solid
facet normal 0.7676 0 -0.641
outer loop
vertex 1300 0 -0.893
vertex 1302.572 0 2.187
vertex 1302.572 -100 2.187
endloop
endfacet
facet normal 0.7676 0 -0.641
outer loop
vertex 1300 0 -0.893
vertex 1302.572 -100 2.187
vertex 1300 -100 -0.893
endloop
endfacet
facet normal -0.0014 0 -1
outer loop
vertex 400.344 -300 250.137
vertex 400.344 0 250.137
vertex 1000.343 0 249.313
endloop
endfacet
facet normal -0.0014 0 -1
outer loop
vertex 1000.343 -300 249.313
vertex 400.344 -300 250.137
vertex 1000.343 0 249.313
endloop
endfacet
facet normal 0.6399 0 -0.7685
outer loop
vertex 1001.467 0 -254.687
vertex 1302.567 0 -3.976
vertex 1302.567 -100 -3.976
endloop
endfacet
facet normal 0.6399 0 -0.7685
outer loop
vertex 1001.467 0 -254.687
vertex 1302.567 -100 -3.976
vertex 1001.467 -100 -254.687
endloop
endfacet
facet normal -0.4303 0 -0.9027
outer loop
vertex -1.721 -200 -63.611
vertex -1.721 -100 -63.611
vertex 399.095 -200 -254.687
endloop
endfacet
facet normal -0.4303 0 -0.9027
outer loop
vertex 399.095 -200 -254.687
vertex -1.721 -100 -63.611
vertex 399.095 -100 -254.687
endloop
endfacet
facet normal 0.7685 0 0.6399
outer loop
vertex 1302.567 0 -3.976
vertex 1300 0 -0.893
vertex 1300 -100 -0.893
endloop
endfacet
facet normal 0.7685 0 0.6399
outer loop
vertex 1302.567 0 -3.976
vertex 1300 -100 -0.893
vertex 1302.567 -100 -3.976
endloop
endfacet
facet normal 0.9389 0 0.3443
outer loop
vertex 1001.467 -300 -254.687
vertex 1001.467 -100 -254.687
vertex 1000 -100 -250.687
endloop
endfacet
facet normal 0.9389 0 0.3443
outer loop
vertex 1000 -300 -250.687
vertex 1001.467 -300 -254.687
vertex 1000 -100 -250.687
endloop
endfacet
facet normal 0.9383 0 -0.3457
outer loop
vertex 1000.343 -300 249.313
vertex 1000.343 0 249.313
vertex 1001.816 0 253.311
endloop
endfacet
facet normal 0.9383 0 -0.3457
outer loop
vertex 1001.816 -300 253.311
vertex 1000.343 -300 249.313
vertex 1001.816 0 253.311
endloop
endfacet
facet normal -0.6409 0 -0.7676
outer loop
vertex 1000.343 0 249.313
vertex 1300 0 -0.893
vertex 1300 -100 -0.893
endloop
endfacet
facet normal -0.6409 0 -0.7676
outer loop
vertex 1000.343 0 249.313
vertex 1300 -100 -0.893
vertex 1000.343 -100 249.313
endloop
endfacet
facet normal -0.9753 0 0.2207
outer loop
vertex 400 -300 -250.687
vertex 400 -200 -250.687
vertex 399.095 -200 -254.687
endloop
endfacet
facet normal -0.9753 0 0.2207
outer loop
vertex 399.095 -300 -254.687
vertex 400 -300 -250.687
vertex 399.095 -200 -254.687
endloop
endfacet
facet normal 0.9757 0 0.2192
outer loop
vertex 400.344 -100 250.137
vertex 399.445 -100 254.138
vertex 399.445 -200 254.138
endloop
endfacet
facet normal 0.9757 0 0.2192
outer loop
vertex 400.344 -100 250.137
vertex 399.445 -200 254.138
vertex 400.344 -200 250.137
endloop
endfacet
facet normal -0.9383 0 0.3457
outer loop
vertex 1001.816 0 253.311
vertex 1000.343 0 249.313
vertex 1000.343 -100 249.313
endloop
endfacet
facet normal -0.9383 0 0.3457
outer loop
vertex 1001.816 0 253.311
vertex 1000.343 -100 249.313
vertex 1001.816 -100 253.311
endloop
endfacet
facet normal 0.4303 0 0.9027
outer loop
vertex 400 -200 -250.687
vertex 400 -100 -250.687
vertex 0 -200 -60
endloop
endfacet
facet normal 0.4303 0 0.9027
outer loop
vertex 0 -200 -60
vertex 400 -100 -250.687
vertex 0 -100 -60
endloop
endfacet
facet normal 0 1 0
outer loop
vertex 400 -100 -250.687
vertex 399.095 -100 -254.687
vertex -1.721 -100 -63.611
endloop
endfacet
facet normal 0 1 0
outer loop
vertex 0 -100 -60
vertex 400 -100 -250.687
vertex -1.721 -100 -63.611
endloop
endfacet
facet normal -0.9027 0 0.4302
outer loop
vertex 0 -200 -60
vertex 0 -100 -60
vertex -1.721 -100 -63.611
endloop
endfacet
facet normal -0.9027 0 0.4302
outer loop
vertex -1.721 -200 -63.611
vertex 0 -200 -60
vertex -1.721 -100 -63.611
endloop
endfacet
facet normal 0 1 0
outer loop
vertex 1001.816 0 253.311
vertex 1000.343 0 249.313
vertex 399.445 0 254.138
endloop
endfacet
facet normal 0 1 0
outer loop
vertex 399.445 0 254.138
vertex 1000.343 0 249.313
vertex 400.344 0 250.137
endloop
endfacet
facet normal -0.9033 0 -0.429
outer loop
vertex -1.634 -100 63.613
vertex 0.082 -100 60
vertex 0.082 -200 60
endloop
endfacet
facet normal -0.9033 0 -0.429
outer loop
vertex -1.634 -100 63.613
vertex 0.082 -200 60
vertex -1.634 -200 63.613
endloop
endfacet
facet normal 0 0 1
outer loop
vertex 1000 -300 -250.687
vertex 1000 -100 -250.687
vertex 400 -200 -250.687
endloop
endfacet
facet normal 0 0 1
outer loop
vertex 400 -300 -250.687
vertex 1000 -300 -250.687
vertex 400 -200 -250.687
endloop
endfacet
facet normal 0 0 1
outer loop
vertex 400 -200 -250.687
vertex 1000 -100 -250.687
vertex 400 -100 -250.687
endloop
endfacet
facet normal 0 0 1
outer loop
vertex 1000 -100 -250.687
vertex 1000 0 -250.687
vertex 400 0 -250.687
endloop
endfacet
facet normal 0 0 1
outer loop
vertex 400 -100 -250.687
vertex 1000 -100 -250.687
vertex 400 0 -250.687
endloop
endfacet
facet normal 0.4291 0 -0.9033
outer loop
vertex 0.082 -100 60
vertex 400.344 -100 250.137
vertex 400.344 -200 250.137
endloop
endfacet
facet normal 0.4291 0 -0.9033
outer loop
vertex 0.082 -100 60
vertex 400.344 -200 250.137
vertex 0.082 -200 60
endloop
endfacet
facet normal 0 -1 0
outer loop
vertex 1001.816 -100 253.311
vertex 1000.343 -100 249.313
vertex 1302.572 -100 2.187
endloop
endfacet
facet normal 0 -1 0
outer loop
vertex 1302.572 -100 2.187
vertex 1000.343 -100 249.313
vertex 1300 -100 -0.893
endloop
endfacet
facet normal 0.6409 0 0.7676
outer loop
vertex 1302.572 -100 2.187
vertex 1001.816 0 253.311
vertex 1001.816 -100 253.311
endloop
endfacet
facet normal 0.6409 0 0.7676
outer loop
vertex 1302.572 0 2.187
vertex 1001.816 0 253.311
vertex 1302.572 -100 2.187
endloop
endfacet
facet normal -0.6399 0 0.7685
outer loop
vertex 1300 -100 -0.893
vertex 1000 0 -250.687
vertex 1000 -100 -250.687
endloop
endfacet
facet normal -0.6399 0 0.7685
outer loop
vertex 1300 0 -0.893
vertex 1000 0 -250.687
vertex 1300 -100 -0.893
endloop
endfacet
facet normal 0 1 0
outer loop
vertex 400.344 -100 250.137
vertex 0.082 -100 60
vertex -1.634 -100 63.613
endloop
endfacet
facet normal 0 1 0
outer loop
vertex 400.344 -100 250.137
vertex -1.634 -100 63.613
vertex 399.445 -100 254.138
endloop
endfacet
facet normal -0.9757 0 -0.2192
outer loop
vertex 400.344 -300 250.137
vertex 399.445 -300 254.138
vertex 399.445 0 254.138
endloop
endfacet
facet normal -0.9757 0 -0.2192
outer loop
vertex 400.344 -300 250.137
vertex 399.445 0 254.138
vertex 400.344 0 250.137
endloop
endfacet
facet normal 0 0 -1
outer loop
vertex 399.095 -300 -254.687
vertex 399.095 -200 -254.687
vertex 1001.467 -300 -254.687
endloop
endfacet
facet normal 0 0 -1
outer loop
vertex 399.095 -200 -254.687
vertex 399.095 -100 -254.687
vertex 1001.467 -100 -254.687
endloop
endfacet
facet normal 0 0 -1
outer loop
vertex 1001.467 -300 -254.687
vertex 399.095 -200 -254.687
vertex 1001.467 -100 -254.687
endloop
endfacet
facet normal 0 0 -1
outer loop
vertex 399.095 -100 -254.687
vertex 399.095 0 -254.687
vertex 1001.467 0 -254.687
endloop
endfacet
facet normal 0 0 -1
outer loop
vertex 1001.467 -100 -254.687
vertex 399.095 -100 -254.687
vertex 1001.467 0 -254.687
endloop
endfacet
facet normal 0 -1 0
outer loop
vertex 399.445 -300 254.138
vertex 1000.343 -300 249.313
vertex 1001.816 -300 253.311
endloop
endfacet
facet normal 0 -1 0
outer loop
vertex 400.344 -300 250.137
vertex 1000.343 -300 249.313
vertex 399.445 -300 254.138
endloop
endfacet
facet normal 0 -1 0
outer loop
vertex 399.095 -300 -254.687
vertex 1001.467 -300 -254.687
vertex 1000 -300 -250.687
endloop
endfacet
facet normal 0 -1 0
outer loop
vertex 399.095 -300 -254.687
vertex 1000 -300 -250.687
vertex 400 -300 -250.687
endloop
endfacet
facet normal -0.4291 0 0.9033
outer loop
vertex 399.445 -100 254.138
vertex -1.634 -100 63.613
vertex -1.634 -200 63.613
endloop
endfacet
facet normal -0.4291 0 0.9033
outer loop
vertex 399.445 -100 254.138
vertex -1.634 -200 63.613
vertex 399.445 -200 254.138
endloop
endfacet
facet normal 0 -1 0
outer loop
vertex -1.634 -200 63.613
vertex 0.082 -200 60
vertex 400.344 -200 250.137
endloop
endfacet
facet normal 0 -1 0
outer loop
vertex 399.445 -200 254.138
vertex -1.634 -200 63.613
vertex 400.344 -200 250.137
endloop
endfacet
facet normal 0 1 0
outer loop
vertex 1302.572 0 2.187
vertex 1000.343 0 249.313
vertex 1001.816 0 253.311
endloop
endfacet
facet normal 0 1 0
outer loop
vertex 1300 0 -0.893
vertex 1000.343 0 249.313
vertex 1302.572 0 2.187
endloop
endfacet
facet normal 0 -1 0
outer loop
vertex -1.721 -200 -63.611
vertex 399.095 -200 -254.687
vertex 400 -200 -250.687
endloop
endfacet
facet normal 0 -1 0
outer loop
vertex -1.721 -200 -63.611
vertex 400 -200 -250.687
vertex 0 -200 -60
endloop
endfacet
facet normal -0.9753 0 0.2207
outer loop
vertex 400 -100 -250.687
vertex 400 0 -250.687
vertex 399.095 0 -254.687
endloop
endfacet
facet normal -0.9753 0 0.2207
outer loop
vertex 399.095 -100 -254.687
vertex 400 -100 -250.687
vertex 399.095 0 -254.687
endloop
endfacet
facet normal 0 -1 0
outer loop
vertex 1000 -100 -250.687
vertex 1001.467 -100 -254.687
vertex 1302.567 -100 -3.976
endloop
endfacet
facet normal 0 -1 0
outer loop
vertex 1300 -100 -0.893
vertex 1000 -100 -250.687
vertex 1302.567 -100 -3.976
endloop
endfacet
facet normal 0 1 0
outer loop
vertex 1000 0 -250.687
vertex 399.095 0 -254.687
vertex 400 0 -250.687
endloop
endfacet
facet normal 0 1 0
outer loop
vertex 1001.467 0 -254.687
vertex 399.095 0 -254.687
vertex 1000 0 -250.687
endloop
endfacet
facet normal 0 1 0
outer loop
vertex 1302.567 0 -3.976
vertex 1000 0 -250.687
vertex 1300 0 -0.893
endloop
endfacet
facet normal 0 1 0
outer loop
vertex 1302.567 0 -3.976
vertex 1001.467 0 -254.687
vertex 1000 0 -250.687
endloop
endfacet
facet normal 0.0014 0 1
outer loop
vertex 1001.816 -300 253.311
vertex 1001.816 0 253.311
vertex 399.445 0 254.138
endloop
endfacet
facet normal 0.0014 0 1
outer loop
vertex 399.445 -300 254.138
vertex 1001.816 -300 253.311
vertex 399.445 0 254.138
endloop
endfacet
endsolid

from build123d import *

# Parameters (mm, degrees)
BOSS_EXTRUDE2_DEPTH   = 300
BOSS_EXTRUDE2_2_DEPTH = 300
BOSS_EXTRUDE3_DEPTH   = 100
BOSS_EXTRUDE6_START   = -100
BOSS_EXTRUDE6_DEPTH   = 100


with BuildPart() as part:
    # Sketch1 → Boss-Extrude2 (new body)
    with BuildSketch(Plane(origin=(0, 0, 0), x_dir=(1, 0, 0), z_dir=(0, 1, 0))):
        Polygon((1001.466566722, 254.686940296), (399.095334701, 254.686940296), (400, 250.686940296), (1000, 250.686940296), align=None)
    extrude(amount=-BOSS_EXTRUDE2_DEPTH)

    # Sketch1_8 → Boss-Extrude3 (add)
    with BuildSketch(Plane(origin=(0, 0, 0), x_dir=(1, 0, 0), z_dir=(0, 1, 0))):
        Polygon((1302.571620685, -2.186929879), (1300, 0.892945716), (1000.343440579, -249.312941753), (1001.815500965, -253.310923265), align=None)
        Polygon((1302.567387242, 3.976351199), (1001.466566722, 254.686940296), (1000, 250.686940296), (1300, 0.892945716), align=None)
    extrude(amount=-BOSS_EXTRUDE3_DEPTH)


with BuildPart() as body_2:
    # Sketch1 → Boss-Extrude2 2 (new body)
    with BuildSketch(Plane(origin=(0, 0, 0), x_dir=(1, 0, 0), z_dir=(0, 1, 0))):
        Polygon((1001.815500965, -253.310923265), (1000.343440579, -249.312941753), (400.344006746, -250.137198948), (399.444837348, -254.138437968), align=None)
    extrude(amount=-BOSS_EXTRUDE2_2_DEPTH)


with BuildPart() as boss_extrude3_piece_1:
    # of the separate pieces the step leaves, piece 1, a body of its own (boss_extrude3_pieces)
    add(part.part.solids().sort_by_distance((1001.466566722, 0, -254.686940296))[0])

    # Sketch1_11 → Boss-Extrude6 (add)
    with BuildSketch(Plane(origin=(0, 0, 0), x_dir=(1, 0, 0), z_dir=(0, 1, 0)).offset(BOSS_EXTRUDE6_START)):
        Polygon((399.095334701, 254.686940296), (-1.721284804, 63.610717496), (0, 60.000014154), (400, 250.686940296), align=None)
        Polygon((399.444837348, -254.138437968), (400.344006746, -250.137198948), (0.082425739, -59.999957537), (-1.633897194, -63.613022108), align=None)
    extrude(amount=-BOSS_EXTRUDE6_DEPTH)


with BuildPart() as boss_extrude3_piece_2:
    # of the separate pieces the step leaves, piece 2, a body of its own (boss_extrude3_pieces)
    add(part.part.solids().sort_by_distance((1000.343440579, 0, 249.312941753))[0])


with BuildPart() as boss_extrude6_piece_1:
    # of the separate pieces the step leaves, piece 1, a body of its own (boss_extrude6_pieces)
    add(boss_extrude3_piece_1.part.solids().sort_by_distance((1001.466566722, 0, -254.686940296))[0])


with BuildPart() as boss_extrude6_piece_2:
    # of the separate pieces the step leaves, piece 2, a body of its own (boss_extrude6_pieces)
    add(boss_extrude3_piece_1.part.solids().sort_by_distance((0.082425739, -100, 59.999957537))[0])


solid = Compound([body_2.part, boss_extrude3_piece_2.part, boss_extrude6_piece_1.part, boss_extrude6_piece_2.part])
